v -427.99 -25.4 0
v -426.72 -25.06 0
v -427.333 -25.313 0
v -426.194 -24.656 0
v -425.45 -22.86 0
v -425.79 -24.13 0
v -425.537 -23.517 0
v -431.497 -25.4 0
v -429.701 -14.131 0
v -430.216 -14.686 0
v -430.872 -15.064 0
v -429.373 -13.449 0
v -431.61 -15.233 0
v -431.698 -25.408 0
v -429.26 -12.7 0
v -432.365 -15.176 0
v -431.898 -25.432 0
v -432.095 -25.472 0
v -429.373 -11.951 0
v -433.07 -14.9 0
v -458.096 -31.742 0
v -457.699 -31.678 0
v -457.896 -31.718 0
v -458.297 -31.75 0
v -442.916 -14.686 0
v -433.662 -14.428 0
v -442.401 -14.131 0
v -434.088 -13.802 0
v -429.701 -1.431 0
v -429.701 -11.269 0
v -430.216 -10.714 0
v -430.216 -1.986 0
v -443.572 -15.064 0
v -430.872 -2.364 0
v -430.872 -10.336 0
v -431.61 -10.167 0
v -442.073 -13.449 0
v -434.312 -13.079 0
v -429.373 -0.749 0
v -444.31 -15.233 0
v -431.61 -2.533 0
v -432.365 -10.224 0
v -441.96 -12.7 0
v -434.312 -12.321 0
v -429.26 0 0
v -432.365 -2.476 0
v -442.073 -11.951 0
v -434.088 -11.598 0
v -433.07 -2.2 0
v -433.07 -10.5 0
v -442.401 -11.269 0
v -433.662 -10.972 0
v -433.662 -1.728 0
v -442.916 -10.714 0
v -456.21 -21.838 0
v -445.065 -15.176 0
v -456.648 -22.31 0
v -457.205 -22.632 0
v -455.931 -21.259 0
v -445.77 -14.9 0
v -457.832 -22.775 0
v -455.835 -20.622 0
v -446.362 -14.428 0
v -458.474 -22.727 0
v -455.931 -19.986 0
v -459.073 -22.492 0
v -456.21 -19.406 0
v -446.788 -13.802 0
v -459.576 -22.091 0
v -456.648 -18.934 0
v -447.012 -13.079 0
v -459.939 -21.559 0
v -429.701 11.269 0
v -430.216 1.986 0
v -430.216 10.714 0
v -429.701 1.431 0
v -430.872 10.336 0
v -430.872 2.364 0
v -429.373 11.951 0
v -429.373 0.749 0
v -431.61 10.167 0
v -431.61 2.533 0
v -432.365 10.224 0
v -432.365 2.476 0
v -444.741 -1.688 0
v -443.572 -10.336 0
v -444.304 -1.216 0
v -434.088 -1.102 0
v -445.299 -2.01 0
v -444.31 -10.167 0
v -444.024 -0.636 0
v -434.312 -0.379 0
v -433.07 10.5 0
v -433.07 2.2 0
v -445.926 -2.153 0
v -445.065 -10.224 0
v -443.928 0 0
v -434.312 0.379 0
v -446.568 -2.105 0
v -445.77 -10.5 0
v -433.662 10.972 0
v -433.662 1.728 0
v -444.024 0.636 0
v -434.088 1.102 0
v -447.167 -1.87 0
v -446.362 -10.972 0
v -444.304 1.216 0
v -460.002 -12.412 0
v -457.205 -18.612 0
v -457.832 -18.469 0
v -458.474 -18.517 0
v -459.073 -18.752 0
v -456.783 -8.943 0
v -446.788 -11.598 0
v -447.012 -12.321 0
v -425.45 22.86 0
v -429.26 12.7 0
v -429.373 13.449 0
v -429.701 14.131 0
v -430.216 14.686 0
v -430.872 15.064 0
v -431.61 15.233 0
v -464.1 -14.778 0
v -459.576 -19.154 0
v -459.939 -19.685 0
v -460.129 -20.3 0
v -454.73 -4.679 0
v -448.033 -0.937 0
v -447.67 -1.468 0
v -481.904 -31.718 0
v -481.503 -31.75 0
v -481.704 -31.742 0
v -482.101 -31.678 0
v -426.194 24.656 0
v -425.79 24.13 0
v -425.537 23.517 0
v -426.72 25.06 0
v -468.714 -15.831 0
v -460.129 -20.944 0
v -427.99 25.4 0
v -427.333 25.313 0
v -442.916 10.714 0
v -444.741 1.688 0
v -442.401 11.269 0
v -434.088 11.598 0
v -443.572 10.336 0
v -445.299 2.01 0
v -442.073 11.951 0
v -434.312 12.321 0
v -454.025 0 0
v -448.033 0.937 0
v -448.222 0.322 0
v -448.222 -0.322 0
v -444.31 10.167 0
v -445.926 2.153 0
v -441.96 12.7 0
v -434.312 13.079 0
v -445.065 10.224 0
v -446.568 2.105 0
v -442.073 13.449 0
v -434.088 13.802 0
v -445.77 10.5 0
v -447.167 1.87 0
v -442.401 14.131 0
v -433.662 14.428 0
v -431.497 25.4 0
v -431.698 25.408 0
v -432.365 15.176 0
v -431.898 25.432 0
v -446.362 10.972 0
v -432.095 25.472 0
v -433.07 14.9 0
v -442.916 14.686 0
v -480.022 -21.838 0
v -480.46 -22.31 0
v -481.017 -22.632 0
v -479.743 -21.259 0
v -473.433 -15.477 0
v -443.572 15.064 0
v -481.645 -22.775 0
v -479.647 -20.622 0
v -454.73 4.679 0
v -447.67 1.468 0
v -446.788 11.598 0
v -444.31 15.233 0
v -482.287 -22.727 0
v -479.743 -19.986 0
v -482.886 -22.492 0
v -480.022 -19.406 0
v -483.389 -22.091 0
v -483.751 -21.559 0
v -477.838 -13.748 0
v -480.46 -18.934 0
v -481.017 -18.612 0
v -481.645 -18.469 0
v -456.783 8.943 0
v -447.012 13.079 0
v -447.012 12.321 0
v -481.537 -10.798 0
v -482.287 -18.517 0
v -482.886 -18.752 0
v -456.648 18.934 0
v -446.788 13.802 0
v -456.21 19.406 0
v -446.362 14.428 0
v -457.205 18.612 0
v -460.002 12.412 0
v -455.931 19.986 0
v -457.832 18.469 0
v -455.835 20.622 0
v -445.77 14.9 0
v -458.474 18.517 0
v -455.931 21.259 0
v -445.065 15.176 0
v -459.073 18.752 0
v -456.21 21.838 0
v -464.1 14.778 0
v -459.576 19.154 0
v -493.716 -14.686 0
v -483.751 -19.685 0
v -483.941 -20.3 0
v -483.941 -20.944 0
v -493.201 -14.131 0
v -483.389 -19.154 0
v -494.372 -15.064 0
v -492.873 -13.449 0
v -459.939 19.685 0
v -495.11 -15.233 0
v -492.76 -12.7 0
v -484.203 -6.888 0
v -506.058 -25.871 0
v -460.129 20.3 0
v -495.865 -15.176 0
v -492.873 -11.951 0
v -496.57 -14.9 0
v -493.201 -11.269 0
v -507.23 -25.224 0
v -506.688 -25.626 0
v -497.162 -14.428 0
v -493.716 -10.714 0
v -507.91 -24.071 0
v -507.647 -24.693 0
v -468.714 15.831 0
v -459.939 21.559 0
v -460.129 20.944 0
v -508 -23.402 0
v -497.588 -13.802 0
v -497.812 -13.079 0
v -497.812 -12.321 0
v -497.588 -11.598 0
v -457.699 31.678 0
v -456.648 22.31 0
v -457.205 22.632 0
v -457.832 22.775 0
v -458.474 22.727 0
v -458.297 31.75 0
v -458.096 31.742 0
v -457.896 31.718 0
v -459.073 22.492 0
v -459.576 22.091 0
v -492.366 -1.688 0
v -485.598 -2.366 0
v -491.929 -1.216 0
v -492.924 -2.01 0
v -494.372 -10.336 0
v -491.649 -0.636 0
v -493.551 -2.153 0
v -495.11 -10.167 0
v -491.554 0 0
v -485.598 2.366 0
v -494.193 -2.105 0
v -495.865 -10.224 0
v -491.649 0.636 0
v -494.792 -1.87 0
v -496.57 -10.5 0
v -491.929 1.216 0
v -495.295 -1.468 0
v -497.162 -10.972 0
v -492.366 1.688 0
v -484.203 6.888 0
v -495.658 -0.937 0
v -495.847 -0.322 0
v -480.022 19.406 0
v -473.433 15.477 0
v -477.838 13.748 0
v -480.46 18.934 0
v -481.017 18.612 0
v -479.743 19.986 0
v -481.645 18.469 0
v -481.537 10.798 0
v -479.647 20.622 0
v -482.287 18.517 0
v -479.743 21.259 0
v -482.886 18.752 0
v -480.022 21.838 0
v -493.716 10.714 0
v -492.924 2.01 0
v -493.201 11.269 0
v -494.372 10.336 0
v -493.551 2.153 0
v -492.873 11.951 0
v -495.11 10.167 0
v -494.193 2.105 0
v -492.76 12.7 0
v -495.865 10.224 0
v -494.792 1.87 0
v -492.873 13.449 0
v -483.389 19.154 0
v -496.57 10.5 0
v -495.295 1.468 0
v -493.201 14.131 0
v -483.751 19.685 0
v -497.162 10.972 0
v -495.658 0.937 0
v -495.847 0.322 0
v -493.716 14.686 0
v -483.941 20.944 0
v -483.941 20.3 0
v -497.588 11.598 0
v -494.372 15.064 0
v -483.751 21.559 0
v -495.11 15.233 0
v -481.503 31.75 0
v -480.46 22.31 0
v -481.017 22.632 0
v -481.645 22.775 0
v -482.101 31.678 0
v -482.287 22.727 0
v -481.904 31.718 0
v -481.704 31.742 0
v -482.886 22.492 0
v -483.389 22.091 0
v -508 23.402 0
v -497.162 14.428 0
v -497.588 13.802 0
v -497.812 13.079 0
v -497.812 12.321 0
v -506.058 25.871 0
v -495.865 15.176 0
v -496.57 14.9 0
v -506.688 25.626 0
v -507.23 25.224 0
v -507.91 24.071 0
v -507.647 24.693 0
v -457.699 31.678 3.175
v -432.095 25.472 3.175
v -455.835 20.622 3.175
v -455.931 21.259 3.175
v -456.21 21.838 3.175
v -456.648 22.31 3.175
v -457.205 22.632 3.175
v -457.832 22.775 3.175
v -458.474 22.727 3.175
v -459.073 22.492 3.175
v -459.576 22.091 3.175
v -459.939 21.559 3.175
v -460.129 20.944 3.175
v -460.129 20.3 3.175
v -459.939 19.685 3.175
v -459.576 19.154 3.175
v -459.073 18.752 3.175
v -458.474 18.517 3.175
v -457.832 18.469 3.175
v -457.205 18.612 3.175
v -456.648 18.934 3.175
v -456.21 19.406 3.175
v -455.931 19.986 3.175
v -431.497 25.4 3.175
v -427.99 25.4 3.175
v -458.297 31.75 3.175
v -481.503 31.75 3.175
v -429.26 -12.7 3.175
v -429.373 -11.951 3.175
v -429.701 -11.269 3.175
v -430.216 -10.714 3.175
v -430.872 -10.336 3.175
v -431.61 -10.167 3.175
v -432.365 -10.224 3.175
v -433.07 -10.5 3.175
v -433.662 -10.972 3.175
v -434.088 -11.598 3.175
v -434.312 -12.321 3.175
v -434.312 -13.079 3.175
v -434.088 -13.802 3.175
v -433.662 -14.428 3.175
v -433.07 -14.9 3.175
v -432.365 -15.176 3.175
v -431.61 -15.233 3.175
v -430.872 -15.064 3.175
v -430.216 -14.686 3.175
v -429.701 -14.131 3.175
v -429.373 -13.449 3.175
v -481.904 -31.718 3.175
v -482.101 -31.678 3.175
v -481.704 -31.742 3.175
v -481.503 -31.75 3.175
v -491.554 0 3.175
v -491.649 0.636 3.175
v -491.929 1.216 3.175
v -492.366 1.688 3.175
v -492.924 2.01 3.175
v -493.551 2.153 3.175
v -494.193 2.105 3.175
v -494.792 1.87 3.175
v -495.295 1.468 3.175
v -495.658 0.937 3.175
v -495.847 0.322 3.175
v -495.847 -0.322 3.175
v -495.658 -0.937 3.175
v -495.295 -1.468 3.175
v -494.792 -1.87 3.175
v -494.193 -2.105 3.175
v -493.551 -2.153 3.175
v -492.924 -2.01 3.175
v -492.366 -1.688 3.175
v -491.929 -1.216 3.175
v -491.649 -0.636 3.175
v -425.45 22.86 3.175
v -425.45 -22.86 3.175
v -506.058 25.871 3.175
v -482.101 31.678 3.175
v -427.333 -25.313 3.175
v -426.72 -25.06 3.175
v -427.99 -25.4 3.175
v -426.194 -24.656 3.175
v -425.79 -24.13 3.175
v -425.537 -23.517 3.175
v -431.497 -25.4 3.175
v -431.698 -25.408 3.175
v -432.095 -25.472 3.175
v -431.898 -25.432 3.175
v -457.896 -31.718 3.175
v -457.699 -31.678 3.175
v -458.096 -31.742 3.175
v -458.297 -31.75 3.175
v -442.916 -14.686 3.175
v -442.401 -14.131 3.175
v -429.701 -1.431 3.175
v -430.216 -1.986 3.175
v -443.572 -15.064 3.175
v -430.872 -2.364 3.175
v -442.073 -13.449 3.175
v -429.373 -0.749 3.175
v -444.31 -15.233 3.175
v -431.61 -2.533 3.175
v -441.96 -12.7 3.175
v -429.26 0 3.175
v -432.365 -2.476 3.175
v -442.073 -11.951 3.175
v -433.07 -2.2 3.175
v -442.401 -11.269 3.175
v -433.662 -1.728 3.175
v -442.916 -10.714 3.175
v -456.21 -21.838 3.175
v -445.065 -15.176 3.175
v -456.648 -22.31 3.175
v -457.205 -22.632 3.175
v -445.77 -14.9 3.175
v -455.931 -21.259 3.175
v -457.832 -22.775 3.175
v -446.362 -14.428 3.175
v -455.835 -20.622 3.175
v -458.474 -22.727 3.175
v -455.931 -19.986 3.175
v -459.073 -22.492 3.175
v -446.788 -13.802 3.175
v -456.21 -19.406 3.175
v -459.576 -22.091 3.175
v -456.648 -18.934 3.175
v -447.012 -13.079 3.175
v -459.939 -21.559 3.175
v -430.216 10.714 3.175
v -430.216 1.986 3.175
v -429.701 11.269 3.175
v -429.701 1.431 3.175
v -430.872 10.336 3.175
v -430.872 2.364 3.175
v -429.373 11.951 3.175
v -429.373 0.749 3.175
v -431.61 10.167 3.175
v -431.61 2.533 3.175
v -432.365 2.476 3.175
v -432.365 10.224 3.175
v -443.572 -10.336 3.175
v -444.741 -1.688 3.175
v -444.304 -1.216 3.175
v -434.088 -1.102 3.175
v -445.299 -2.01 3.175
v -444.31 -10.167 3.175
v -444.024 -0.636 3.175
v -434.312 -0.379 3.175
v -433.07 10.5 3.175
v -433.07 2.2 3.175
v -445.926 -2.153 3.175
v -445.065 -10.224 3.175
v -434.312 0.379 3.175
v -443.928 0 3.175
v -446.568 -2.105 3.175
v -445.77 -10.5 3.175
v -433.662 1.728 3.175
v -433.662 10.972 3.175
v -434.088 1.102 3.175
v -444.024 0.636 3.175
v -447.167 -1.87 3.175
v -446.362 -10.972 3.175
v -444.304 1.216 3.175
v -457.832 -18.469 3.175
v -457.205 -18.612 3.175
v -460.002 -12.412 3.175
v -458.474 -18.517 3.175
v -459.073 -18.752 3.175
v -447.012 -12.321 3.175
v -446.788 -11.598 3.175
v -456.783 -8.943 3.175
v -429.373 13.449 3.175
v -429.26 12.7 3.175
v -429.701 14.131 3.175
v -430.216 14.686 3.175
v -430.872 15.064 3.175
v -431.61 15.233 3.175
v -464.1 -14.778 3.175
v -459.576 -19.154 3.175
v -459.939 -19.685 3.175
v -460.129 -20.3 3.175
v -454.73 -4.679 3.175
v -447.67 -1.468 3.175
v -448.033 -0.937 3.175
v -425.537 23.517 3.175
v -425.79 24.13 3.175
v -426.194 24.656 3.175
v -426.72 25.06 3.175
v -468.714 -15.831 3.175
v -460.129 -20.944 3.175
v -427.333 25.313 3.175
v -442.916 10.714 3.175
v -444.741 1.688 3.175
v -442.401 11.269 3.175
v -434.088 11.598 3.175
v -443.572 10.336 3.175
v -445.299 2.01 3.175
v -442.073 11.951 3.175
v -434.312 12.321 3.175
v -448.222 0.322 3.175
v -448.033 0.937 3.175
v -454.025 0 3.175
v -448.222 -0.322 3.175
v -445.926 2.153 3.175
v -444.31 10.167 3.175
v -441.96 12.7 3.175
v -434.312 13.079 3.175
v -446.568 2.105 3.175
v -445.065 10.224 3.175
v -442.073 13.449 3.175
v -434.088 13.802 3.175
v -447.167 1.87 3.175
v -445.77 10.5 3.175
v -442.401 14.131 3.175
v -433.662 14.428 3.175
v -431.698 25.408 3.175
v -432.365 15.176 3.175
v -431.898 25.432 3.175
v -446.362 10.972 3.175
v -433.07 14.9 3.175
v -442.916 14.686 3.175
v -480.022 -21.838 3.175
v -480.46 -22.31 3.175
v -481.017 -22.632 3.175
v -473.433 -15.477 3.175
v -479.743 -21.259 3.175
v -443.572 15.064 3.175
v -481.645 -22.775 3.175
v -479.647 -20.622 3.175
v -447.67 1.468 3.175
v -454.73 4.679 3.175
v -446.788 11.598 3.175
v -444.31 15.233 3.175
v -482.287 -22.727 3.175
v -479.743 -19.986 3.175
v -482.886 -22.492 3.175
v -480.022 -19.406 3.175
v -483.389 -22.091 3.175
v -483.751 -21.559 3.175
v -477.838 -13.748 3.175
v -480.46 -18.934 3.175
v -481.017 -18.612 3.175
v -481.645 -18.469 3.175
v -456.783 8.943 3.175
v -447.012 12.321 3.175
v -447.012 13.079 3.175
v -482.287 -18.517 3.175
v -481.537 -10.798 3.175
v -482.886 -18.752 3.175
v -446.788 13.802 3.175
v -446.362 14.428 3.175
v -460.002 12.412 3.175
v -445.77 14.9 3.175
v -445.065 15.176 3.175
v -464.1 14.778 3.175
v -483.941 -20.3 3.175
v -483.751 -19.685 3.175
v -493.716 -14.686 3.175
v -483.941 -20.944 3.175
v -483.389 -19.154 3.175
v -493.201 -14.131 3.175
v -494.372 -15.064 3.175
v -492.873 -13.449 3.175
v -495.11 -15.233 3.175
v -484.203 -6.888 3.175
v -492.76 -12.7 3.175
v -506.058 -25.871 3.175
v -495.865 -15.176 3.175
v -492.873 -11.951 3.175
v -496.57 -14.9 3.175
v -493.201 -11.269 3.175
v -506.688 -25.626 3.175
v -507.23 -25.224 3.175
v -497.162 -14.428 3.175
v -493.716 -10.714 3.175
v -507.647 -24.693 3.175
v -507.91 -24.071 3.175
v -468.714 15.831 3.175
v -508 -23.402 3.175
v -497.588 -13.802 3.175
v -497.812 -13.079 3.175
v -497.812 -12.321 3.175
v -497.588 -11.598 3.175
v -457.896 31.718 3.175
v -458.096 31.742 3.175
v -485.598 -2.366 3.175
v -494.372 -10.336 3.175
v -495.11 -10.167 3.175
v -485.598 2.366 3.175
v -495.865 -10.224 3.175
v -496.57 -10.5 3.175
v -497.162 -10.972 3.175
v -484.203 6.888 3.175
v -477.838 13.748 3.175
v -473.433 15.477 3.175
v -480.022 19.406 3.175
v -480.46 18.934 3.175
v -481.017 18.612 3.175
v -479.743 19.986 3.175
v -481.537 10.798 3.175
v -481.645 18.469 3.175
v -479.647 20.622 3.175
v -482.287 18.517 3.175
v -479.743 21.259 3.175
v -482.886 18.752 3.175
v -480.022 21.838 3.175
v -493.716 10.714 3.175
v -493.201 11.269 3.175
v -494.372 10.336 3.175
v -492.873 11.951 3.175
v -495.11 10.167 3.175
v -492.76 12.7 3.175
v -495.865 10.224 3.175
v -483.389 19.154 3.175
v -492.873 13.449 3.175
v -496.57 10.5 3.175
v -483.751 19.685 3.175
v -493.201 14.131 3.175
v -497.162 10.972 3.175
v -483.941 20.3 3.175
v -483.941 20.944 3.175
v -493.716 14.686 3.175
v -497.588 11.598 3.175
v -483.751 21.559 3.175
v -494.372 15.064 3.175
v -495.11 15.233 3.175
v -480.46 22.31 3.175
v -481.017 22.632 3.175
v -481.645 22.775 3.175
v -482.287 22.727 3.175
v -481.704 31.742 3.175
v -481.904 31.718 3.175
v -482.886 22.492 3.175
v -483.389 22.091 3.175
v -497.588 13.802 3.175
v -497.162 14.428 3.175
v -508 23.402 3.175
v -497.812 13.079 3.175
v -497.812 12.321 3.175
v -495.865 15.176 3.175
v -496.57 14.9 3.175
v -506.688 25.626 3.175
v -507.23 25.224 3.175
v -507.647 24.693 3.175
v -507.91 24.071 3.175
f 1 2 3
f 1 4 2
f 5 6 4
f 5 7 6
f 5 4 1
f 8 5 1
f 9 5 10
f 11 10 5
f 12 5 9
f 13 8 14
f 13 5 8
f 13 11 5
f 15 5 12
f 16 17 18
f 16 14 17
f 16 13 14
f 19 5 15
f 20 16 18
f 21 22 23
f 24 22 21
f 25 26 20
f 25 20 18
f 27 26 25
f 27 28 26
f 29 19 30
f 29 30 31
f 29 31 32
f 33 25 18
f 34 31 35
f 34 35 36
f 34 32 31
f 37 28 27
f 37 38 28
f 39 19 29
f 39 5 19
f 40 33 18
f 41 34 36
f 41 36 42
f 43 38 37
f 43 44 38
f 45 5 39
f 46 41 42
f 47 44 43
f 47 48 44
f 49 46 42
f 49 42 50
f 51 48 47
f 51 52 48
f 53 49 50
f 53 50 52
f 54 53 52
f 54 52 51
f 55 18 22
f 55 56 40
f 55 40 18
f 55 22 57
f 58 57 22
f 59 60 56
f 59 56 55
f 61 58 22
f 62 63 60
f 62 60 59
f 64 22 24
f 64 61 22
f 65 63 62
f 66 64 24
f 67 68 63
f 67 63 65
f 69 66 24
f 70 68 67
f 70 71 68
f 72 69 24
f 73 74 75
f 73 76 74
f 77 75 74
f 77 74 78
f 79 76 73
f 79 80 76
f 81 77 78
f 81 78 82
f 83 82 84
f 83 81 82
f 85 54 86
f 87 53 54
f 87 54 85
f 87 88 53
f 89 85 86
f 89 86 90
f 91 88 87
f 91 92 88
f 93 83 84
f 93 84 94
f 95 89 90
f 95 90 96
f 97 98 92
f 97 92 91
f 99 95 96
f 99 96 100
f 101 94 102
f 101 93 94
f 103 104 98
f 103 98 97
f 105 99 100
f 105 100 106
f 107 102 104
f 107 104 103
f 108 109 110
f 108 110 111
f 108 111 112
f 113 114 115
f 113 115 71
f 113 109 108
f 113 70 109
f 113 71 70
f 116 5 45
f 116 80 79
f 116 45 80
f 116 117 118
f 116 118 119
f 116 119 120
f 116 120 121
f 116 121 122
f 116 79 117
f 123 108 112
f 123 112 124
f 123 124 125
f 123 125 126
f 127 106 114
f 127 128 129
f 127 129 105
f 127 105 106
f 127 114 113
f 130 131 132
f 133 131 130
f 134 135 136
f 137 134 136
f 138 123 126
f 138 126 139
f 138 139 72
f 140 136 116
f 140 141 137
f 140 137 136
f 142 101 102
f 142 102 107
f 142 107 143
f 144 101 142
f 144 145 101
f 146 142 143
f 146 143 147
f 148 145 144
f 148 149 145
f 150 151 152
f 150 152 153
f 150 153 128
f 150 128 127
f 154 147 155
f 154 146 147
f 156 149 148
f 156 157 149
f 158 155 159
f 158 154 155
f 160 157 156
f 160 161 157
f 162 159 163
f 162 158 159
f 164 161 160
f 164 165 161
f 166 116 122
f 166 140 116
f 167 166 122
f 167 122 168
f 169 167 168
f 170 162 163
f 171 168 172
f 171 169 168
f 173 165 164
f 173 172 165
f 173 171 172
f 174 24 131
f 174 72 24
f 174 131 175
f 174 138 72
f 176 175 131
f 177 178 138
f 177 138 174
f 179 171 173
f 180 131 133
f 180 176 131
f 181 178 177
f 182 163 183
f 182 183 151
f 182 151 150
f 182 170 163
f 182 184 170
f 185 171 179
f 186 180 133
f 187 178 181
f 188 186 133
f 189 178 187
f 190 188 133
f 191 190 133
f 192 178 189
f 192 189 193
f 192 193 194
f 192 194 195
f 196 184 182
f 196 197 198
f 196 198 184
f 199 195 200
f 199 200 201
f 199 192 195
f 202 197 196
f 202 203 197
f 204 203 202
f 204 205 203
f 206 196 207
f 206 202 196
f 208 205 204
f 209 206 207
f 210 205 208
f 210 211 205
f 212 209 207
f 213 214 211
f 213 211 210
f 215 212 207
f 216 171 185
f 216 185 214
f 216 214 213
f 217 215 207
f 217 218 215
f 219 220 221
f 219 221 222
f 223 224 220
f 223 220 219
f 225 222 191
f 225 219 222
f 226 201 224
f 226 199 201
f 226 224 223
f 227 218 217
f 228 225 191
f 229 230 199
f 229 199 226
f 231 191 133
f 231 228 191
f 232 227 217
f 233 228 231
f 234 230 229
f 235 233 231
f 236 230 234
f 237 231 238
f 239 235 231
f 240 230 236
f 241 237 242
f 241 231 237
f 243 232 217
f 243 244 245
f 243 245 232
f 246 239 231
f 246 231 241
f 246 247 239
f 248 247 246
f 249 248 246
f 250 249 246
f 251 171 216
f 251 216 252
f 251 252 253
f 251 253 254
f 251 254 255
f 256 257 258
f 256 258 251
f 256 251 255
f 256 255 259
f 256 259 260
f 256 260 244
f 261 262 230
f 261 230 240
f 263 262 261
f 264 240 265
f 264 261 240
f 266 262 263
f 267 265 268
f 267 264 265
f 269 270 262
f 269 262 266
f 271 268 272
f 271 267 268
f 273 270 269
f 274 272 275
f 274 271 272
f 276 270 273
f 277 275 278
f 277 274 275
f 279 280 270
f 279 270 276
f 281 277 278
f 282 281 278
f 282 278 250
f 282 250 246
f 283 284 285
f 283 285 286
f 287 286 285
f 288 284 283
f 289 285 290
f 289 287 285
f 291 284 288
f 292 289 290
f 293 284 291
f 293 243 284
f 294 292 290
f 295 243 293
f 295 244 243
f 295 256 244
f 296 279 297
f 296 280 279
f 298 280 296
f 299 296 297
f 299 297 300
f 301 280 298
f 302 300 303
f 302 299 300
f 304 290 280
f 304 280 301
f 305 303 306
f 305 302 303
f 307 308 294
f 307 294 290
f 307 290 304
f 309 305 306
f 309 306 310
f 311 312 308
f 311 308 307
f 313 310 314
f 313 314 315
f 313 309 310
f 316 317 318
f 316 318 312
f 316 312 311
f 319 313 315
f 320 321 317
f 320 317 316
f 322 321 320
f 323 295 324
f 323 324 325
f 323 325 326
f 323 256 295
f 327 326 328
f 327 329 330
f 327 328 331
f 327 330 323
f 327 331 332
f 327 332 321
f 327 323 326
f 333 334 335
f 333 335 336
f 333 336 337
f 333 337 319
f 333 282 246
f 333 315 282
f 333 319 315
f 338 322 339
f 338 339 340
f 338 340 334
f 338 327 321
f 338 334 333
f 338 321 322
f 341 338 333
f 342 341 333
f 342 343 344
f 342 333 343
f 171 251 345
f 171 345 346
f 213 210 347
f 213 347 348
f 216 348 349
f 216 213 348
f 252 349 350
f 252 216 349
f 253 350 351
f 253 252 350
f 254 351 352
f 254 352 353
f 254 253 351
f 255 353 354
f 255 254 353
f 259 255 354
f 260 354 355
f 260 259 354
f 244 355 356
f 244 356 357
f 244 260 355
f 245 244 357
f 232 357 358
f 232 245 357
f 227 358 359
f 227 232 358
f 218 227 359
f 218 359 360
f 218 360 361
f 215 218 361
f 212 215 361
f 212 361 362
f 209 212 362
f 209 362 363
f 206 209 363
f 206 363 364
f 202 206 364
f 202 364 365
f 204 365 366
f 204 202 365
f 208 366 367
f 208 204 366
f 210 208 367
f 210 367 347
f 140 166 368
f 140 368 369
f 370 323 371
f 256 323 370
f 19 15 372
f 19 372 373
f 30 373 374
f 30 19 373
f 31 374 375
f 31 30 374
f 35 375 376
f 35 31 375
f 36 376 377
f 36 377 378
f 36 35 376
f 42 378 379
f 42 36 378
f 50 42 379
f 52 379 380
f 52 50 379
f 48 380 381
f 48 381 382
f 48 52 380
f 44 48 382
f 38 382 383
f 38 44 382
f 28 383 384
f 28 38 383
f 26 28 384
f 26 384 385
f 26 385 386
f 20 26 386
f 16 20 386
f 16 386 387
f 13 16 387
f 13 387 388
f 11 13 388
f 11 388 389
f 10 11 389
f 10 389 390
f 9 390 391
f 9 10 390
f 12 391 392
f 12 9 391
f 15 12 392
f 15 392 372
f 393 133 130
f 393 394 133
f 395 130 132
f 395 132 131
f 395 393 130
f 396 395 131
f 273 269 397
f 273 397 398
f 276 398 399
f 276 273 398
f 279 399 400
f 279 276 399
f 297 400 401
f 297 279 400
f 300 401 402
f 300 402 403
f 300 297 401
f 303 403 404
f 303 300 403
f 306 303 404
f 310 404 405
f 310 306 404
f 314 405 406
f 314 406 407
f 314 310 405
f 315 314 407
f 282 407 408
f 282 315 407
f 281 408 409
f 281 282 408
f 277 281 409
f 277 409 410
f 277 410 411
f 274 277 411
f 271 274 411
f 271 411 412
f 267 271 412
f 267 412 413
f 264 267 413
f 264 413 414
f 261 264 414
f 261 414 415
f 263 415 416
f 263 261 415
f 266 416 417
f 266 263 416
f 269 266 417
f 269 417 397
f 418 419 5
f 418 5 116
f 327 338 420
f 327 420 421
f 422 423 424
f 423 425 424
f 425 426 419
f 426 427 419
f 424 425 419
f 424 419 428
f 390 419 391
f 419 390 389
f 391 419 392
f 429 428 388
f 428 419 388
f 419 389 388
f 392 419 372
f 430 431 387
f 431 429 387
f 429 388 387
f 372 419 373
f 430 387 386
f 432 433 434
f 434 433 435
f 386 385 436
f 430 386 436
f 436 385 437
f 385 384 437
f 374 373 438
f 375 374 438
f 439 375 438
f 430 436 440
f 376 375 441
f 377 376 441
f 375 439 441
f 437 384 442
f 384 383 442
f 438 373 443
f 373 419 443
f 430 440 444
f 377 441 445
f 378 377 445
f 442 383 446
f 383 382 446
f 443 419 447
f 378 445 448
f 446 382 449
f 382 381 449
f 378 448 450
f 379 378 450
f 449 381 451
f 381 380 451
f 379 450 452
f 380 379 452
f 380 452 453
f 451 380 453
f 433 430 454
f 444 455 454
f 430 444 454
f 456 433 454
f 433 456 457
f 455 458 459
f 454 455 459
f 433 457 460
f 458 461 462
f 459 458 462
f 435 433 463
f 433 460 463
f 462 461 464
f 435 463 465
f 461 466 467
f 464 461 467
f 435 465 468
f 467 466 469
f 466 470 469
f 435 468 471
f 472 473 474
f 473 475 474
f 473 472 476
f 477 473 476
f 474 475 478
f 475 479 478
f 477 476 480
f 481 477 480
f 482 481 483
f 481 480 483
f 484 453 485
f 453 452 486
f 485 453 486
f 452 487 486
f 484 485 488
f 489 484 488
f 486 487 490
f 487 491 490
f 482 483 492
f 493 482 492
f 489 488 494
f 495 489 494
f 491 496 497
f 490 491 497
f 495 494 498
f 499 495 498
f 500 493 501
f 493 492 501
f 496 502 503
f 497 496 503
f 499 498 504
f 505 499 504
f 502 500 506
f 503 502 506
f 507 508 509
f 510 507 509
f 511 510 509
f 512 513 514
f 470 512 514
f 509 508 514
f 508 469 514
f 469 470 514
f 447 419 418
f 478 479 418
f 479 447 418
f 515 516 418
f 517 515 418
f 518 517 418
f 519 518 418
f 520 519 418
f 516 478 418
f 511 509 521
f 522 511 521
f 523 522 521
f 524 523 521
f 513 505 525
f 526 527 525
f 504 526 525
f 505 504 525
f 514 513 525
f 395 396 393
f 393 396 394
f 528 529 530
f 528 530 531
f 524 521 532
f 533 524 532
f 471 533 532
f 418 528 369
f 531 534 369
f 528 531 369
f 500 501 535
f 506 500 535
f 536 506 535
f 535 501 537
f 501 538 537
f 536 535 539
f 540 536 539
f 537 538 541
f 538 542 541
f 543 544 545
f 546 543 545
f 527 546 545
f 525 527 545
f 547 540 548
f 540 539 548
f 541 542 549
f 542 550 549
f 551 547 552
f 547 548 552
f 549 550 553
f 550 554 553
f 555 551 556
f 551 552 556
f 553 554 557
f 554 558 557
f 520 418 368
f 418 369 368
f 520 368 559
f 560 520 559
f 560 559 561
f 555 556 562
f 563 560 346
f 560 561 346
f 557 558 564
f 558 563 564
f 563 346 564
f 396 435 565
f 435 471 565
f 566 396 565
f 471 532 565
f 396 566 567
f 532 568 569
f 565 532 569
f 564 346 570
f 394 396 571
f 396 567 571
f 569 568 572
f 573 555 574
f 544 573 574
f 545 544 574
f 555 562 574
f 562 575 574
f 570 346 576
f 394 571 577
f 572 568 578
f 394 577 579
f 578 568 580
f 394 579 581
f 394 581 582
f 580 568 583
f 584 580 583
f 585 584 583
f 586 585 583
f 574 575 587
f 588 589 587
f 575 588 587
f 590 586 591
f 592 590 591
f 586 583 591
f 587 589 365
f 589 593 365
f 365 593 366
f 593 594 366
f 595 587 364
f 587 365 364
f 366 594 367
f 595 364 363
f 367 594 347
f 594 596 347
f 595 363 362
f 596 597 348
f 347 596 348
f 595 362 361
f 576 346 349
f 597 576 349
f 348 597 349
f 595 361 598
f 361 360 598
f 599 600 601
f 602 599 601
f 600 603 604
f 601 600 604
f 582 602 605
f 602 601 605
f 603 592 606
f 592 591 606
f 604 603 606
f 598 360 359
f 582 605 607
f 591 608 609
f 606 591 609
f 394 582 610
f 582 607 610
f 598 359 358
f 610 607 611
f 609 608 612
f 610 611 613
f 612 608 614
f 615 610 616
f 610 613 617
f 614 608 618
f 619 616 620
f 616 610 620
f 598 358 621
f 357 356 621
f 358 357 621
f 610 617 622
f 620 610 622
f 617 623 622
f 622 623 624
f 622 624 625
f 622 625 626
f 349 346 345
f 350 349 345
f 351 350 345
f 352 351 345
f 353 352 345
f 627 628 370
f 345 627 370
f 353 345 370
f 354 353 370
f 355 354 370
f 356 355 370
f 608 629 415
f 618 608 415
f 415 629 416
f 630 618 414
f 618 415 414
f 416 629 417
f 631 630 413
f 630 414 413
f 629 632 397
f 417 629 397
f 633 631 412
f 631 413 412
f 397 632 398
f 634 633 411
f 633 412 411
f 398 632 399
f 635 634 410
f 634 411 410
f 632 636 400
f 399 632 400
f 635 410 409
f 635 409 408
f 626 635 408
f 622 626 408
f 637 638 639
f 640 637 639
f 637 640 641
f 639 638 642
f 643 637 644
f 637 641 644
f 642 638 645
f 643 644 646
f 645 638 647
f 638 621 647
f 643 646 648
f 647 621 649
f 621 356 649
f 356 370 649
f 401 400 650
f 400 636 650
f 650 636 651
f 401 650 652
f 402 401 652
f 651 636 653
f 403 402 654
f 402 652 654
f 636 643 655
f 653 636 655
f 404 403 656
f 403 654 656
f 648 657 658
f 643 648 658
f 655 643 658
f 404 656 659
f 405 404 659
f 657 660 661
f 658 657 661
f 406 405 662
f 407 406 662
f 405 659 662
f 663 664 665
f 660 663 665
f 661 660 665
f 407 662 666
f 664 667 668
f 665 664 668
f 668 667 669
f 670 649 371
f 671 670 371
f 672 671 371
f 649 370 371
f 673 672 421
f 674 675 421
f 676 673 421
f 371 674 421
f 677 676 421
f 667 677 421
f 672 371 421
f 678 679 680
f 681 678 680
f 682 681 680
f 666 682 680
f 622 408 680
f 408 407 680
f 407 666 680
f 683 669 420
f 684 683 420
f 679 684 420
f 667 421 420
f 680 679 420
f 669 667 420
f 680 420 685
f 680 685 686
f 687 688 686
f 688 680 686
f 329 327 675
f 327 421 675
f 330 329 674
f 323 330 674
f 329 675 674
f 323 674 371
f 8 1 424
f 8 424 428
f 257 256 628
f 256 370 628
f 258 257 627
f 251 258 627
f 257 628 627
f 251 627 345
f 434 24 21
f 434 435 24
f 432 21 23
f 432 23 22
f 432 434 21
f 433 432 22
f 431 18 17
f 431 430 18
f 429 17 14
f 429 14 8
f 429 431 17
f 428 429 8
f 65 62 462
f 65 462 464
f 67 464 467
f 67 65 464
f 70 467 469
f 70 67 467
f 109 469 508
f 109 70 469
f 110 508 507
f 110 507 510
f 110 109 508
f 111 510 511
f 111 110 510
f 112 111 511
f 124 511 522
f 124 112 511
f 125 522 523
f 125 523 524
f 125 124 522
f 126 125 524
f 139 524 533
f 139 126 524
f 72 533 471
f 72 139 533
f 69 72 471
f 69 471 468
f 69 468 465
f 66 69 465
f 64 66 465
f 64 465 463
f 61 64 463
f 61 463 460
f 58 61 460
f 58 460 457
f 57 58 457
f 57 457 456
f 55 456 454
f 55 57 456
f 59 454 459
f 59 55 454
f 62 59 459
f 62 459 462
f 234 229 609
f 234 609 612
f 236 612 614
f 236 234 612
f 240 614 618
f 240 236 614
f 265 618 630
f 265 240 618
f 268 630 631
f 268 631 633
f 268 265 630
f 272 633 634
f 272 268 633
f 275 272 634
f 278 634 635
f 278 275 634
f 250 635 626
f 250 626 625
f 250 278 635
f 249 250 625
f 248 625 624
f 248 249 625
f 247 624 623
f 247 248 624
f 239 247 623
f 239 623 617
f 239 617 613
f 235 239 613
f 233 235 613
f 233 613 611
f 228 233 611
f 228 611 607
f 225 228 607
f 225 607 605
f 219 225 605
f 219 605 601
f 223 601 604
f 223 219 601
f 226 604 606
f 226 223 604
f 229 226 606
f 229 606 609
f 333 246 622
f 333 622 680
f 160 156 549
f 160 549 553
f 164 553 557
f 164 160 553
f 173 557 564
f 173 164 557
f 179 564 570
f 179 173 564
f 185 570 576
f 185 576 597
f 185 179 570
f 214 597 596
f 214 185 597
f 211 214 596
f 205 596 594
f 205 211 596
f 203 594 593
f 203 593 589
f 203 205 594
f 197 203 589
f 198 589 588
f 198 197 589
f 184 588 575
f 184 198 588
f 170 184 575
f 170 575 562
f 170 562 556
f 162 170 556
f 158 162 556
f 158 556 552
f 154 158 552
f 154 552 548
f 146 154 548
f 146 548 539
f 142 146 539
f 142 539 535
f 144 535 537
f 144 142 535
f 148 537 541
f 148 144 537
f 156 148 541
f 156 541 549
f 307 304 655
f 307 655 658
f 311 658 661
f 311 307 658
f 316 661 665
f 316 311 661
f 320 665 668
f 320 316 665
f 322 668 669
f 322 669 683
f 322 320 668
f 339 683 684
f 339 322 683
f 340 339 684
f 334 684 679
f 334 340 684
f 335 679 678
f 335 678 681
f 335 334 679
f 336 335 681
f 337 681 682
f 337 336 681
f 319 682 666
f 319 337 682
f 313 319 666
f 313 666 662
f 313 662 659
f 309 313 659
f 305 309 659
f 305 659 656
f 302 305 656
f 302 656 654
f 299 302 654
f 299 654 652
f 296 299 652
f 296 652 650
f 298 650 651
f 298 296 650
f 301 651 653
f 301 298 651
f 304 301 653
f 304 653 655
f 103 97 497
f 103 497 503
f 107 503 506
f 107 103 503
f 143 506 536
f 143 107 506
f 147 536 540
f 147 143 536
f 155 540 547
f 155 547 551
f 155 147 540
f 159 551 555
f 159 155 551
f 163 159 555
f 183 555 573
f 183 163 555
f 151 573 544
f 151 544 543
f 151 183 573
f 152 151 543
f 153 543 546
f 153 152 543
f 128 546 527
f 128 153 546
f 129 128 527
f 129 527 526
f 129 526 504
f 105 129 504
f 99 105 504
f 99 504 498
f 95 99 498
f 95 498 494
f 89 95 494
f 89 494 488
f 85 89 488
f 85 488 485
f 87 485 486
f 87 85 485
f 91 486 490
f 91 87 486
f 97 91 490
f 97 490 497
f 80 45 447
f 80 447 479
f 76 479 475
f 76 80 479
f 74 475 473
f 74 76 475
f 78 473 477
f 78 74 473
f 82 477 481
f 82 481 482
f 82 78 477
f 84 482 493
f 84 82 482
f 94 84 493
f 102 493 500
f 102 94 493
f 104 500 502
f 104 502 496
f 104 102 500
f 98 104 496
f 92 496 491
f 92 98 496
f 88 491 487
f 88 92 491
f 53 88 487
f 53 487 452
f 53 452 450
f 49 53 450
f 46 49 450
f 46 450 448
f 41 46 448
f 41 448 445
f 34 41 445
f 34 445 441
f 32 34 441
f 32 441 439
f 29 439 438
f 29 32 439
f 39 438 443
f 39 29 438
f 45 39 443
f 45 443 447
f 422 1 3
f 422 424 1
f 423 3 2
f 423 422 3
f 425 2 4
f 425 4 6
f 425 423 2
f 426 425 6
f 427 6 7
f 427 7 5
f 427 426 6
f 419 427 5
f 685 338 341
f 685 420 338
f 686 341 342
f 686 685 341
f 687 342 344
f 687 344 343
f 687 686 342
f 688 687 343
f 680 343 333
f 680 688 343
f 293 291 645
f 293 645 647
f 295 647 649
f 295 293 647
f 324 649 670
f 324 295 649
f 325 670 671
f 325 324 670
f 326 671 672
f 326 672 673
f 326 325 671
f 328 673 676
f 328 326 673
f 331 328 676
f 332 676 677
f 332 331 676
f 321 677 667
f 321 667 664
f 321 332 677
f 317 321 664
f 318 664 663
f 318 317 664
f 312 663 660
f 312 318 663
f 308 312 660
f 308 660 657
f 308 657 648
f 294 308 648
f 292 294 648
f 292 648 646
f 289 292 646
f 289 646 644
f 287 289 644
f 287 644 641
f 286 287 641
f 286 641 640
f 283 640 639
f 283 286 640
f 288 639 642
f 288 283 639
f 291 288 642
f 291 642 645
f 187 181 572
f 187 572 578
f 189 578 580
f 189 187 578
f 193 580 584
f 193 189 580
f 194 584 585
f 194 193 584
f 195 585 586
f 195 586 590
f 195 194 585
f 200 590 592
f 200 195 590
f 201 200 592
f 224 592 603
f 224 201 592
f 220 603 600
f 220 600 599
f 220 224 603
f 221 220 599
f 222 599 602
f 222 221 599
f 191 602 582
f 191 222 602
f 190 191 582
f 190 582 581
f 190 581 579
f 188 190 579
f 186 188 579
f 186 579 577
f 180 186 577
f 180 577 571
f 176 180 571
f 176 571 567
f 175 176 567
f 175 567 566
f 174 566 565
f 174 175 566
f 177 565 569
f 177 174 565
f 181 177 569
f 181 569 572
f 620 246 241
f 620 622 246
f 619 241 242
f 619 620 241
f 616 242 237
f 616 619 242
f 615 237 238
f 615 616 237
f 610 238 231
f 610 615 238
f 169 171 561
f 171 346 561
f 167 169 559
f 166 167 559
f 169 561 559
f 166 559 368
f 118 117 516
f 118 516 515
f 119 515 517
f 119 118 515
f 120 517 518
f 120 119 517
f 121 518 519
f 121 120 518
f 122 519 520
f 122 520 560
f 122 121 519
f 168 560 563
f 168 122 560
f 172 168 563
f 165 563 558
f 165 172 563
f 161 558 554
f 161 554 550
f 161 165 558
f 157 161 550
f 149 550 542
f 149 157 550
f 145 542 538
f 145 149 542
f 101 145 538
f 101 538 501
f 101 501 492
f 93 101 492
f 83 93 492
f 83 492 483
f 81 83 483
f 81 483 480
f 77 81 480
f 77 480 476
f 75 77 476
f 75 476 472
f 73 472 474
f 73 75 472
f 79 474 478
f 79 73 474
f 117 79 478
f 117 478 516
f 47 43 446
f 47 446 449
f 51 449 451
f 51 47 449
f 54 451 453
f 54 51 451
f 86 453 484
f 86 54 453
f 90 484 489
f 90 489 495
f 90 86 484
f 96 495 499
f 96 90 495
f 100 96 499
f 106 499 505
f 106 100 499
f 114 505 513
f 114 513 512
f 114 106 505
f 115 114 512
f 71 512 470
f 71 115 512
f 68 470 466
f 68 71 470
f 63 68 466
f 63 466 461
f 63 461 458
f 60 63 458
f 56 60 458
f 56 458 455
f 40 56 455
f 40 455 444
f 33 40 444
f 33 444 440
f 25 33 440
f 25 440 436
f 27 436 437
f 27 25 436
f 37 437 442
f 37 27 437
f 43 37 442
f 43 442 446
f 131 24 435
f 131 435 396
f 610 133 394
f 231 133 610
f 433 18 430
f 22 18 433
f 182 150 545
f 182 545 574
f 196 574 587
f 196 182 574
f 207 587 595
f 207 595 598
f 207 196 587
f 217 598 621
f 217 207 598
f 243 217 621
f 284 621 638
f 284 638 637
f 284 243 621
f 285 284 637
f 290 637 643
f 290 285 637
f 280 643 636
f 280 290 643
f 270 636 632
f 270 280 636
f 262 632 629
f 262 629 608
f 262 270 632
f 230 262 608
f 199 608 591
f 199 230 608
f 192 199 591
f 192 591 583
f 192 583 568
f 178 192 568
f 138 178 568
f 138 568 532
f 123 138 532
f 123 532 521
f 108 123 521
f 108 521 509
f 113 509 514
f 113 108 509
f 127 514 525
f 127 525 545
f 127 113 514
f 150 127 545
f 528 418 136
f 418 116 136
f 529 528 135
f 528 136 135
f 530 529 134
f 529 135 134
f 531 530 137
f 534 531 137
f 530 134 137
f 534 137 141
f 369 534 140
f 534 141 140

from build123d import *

# Parameters (mm, degrees)
SKETCH2_R           = 15.875
SKETCH2_R_2         = 2.159
SKETCH2_R_3         = 2.54
BOSS_EXTRUDE1_DEPTH = 3.175
FILLET1_R           = 2.54
SKETCH3_OUTSIDE_W   = 172.398
SKETCH3_OUTSIDE_H   = 96.198
SKETCH3_OUTSIDE_W_2 = 82.55
SKETCH3_OUTSIDE_H_2 = 74.066797773
CUT_EXTRUDE1_DEPTH  = 510.001122911
FILLET2_R           = 2.54


with BuildPart() as part:
    # Sketch2 → Boss-Extrude1 (new body)
    with BuildSketch(Plane.XY):
        Polygon((-508, 25.4), (-481.80625, 31.75), (-457.99375, 31.75), (-431.8, 25.4), (-368.3, 25.4), (-368.3, -25.4), (-431.8, -25.4), (-457.99375, -31.75), (-481.80625, -31.75), (-508, -25.4), align=None)
        with Locations((-469.9, 0)):
            Circle(SKETCH2_R, mode=Mode.SUBTRACT)
        with Locations((-457.99375, 20.622229928)):
            Circle(SKETCH2_R_2, mode=Mode.SUBTRACT)
        with Locations((-481.80625, 20.622229928)):
            Circle(SKETCH2_R_2, mode=Mode.SUBTRACT)
        with Locations((-493.7125, 0)):
            Circle(SKETCH2_R_2, mode=Mode.SUBTRACT)
        with Locations((-481.80625, -20.622229928)):
            Circle(SKETCH2_R_2, mode=Mode.SUBTRACT)
        with Locations((-457.99375, -20.622229928)):
            Circle(SKETCH2_R_2, mode=Mode.SUBTRACT)
        with Locations((-446.0875, 0)):
            Circle(SKETCH2_R_2, mode=Mode.SUBTRACT)
        with Locations((-495.3, 12.7)):
            Circle(SKETCH2_R_3, mode=Mode.SUBTRACT)
        with Locations((-495.3, -12.7)):
            Circle(SKETCH2_R_3, mode=Mode.SUBTRACT)
        with Locations((-444.5, -12.7)):
            Circle(SKETCH2_R_3, mode=Mode.SUBTRACT)
        with Locations((-431.8, -12.7)):
            Circle(SKETCH2_R_3, mode=Mode.SUBTRACT)
        with Locations((-419.1, -12.7)):
            Circle(SKETCH2_R_3, mode=Mode.SUBTRACT)
        with Locations((-419.1, 0)):
            Circle(SKETCH2_R_3, mode=Mode.SUBTRACT)
        with Locations((-431.8, 0)):
            Circle(SKETCH2_R_3, mode=Mode.SUBTRACT)
        with Locations((-431.8, 12.7)):
            Circle(SKETCH2_R_3, mode=Mode.SUBTRACT)
        with Locations((-419.1, 12.7)):
            Circle(SKETCH2_R_3, mode=Mode.SUBTRACT)
        with Locations((-444.5, 12.7)):
            Circle(SKETCH2_R_3, mode=Mode.SUBTRACT)
        with Locations((-406.4, 12.7)):
            Circle(SKETCH2_R_3, mode=Mode.SUBTRACT)
        with Locations((-406.4, 0)):
            Circle(SKETCH2_R_3, mode=Mode.SUBTRACT)
        with Locations((-406.4, -12.7)):
            Circle(SKETCH2_R_3, mode=Mode.SUBTRACT)
        with Locations((-393.7, 12.7)):
            Circle(SKETCH2_R_3, mode=Mode.SUBTRACT)
        with Locations((-393.7, 0)):
            Circle(SKETCH2_R_3, mode=Mode.SUBTRACT)
        with Locations((-393.7, -12.7)):
            Circle(SKETCH2_R_3, mode=Mode.SUBTRACT)
        with Locations((-381, 12.7)):
            Circle(SKETCH2_R_3, mode=Mode.SUBTRACT)
        with Locations((-381, 0)):
            Circle(SKETCH2_R_3, mode=Mode.SUBTRACT)
        with Locations((-381, -12.7)):
            Circle(SKETCH2_R_3, mode=Mode.SUBTRACT)
    extrude(amount=BOSS_EXTRUDE1_DEPTH)

    # Fillet1
    fillet1_edges = [part.edges().sort_by_distance(p)[0] for p in [
        (-508, 25.4, 1.5875),
        (-481.80625, 31.75, 1.5875),
        (-457.99375, 31.75, 1.5875),
        (-431.8, 25.4, 1.5875),
        (-368.3, 25.4, 1.5875),
        (-368.3, -25.4, 1.5875),
        (-431.8, -25.4, 1.5875),
        (-457.99375, -31.75, 1.5875),
        (-481.80625, -31.75, 1.5875),
        (-508, -25.4, 1.5875),
    ]]
    fillet(fillet1_edges, radius=FILLET1_R)

    # Sketch3 outside → Cut-Extrude1 (cut, through all)
    with BuildSketch(Plane.XY.offset(3.175)):
        with Locations((-438.15, 0)):
            Rectangle(SKETCH3_OUTSIDE_W, SKETCH3_OUTSIDE_H)
        with Locations((-466.725, 2.505642685)):
            Rectangle(SKETCH3_OUTSIDE_W_2, SKETCH3_OUTSIDE_H_2, mode=Mode.SUBTRACT)
    extrude(amount=-CUT_EXTRUDE1_DEPTH, mode=Mode.SUBTRACT)

    # Fillet2
    fillet2_edges = [part.edges().sort_by_distance(p)[0] for p in [
        (-425.45, 25.4, 1.5875),
        (-425.45, -25.4, 1.5875),
    ]]
    fillet(fillet2_edges, radius=FILLET2_R)


solid = part.part
